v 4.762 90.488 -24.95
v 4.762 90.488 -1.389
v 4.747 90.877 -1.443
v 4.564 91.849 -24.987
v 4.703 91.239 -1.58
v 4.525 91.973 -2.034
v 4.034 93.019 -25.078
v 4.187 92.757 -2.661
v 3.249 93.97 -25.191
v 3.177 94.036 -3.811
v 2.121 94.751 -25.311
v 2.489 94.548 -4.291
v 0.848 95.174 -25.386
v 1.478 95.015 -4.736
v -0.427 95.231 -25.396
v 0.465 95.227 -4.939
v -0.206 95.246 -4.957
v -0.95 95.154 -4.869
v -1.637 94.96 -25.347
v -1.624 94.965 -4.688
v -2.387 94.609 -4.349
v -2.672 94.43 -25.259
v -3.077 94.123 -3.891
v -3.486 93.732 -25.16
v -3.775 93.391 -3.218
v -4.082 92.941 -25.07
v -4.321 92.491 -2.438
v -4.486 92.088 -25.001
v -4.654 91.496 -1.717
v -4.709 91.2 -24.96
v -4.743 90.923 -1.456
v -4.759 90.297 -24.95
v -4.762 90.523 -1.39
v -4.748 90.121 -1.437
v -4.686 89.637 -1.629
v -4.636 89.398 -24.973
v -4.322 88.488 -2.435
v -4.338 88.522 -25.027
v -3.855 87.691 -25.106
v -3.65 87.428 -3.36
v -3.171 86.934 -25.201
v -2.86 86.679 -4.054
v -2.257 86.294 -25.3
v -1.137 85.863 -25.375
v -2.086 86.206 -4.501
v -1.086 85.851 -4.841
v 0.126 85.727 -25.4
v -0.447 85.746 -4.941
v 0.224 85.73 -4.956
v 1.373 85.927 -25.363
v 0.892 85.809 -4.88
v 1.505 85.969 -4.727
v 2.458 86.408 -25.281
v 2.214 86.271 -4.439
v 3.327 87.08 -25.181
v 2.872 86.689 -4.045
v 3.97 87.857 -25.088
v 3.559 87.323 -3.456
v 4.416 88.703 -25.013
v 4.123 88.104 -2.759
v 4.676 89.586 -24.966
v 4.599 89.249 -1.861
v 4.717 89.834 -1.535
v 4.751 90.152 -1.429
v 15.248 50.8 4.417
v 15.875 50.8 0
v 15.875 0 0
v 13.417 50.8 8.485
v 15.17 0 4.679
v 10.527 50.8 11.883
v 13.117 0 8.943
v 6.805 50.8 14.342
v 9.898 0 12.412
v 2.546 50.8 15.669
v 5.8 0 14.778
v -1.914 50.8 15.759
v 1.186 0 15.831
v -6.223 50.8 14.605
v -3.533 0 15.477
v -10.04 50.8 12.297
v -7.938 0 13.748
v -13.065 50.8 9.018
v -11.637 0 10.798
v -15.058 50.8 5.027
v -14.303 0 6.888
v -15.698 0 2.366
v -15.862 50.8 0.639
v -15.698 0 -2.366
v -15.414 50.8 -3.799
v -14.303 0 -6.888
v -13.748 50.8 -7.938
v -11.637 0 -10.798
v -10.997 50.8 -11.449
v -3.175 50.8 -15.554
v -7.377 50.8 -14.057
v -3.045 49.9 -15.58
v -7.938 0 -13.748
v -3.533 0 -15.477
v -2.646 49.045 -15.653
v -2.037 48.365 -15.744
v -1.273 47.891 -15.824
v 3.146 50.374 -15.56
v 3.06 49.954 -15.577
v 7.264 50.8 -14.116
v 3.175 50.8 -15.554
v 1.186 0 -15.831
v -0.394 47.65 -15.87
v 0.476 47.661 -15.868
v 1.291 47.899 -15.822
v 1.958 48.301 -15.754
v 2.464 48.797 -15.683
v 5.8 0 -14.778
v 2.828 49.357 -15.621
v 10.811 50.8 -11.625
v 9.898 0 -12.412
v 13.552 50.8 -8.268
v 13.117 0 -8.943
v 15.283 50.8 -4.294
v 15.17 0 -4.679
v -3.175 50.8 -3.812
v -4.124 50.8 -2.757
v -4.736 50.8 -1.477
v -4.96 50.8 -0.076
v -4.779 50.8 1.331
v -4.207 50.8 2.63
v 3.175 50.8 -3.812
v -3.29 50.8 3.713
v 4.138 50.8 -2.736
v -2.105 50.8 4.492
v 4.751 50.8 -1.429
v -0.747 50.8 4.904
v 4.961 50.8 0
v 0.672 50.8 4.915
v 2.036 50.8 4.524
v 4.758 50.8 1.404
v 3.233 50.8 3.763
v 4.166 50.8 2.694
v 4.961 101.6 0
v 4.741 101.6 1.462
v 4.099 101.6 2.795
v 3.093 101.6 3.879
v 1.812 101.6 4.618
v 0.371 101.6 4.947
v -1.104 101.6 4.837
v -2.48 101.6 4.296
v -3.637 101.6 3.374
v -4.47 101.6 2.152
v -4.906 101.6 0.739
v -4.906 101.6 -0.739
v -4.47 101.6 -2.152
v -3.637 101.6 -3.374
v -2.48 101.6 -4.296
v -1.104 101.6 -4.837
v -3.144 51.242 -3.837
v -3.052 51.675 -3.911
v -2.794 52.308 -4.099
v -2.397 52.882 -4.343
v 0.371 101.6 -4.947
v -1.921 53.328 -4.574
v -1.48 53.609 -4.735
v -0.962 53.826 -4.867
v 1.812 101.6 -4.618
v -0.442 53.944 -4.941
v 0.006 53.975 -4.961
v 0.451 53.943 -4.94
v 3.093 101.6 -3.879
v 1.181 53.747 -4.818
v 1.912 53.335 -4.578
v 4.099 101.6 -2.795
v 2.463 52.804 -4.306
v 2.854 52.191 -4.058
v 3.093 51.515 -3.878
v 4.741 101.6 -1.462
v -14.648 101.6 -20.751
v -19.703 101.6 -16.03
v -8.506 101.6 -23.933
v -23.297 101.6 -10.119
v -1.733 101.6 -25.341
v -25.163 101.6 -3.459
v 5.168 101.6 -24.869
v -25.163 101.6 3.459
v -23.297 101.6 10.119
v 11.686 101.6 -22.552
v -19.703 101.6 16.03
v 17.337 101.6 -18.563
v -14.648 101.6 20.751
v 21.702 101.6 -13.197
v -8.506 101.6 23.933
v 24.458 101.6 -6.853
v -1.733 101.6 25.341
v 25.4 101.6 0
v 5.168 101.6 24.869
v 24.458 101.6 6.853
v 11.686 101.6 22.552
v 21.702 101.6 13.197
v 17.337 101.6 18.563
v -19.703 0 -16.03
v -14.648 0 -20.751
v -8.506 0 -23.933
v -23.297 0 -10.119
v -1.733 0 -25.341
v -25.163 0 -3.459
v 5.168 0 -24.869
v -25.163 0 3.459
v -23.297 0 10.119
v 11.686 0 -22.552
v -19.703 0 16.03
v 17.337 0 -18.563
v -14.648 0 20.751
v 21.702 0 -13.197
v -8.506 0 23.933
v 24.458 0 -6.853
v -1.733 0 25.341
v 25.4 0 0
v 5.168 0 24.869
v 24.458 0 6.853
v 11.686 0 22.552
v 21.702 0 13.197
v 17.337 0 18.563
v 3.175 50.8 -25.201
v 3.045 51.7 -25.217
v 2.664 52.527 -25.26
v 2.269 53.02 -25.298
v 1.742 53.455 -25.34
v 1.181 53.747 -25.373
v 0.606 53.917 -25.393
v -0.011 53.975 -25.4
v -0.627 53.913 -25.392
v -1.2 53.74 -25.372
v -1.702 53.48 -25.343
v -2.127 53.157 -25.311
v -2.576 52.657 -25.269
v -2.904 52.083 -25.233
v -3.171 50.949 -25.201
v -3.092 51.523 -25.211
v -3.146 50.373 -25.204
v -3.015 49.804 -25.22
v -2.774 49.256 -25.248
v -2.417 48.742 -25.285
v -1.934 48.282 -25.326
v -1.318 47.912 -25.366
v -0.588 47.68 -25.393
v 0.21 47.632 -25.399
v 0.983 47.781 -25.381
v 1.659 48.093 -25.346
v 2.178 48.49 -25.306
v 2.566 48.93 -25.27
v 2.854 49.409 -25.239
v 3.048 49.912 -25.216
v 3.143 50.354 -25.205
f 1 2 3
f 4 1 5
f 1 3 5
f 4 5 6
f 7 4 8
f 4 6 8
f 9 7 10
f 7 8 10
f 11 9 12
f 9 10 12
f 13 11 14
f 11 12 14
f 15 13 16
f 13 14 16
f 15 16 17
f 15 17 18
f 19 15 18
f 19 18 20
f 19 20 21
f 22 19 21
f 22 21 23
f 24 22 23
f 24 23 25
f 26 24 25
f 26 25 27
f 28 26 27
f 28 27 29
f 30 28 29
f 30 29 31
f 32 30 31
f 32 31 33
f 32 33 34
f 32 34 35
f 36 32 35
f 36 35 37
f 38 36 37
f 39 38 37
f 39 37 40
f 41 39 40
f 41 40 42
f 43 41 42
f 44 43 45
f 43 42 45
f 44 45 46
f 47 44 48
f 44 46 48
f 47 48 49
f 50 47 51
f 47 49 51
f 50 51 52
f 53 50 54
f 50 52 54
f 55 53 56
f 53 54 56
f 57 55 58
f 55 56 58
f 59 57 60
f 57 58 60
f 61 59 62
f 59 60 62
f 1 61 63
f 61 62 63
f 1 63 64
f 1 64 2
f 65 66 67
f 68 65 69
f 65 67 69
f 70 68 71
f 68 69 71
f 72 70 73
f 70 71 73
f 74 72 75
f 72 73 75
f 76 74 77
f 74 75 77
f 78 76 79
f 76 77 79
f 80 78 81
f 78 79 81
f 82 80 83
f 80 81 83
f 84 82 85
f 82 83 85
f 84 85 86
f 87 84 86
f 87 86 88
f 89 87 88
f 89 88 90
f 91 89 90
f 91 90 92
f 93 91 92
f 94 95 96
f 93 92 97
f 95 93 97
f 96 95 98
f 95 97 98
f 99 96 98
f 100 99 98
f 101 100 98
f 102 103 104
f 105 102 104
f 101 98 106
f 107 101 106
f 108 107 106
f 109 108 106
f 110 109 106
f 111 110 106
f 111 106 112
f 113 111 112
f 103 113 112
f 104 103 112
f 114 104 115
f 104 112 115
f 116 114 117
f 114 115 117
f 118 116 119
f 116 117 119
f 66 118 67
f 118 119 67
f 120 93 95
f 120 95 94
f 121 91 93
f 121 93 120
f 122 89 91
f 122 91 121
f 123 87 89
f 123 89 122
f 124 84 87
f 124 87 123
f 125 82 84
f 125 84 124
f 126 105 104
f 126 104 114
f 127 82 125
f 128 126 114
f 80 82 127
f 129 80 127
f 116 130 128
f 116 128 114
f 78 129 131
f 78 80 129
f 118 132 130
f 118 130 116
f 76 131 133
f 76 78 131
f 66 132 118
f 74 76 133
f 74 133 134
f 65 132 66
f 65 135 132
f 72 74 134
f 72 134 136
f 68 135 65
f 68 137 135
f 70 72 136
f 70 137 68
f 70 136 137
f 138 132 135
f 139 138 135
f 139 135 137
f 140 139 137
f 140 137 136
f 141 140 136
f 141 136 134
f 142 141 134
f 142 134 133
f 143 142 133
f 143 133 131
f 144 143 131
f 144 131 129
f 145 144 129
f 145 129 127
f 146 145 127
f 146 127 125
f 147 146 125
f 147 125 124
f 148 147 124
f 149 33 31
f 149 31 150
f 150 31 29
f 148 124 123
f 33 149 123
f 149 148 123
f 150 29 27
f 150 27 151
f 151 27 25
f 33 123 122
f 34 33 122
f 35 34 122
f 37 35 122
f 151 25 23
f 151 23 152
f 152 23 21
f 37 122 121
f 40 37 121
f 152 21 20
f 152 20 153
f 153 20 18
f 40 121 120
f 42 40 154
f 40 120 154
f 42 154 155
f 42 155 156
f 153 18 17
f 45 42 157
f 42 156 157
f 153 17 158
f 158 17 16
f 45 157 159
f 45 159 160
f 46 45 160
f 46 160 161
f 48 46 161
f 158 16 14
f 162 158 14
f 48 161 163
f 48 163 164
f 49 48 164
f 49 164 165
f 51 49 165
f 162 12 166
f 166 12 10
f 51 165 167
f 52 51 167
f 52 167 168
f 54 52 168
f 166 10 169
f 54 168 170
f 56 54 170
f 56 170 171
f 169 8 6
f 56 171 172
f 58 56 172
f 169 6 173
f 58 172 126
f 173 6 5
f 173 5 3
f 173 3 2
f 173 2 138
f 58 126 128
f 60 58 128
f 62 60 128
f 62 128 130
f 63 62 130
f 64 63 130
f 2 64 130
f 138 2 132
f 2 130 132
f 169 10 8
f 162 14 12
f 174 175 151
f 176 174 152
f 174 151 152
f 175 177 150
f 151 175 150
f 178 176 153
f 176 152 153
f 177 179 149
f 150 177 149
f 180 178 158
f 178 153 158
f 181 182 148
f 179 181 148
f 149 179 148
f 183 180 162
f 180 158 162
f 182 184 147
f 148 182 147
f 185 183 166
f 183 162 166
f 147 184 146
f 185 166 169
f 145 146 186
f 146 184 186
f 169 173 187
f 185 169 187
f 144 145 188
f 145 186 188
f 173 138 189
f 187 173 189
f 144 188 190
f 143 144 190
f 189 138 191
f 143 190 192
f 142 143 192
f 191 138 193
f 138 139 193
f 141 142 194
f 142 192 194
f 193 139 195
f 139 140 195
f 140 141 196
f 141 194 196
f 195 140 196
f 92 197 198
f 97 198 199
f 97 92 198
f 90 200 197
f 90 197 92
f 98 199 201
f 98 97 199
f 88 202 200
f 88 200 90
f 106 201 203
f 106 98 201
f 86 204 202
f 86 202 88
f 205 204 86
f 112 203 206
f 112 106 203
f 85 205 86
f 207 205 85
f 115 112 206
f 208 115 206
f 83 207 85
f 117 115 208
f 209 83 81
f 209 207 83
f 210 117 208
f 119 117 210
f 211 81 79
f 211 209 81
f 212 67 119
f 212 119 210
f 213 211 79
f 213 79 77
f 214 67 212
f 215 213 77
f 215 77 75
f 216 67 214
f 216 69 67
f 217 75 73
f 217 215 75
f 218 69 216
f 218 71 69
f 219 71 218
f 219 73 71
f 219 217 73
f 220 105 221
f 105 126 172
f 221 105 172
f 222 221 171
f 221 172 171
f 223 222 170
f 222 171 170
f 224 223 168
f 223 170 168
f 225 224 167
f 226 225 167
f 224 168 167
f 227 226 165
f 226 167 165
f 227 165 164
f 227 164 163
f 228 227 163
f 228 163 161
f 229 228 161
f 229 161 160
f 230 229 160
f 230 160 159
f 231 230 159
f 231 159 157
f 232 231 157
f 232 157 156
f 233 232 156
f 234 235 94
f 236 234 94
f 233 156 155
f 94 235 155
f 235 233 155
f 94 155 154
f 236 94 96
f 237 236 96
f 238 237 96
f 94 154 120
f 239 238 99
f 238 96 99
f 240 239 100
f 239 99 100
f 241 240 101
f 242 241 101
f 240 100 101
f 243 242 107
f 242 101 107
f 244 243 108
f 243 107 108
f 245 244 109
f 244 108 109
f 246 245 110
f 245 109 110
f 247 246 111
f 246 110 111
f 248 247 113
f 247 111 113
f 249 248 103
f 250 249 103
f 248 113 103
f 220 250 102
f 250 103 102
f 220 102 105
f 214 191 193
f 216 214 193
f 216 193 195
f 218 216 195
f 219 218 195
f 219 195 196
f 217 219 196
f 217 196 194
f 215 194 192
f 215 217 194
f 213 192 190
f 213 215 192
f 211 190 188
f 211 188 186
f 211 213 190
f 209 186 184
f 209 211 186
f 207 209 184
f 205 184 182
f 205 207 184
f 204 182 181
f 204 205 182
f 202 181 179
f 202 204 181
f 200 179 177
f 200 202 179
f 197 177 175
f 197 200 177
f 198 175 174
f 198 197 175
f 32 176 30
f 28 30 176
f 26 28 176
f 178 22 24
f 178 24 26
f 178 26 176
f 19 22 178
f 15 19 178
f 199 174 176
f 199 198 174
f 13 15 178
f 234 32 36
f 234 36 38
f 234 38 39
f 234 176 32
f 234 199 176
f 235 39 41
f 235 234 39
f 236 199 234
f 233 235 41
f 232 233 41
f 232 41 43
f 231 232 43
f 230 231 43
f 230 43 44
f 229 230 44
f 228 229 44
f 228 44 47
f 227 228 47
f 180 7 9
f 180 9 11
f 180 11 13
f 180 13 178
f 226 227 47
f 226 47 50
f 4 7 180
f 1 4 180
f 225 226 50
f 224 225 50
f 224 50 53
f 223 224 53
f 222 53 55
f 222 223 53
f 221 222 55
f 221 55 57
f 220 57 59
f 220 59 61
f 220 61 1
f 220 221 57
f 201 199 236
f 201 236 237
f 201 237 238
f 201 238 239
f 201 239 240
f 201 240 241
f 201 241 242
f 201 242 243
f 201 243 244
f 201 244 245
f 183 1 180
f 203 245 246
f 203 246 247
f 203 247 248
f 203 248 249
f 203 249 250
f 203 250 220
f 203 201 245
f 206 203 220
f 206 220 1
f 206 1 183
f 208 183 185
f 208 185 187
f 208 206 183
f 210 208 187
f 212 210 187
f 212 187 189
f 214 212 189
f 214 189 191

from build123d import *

# Parameters (mm, degrees)
F0_R     = 25.4
F1_DEPTH = 101.6
F2_R     = 15.875
F3_DEPTH = 50.8
F4_R     = 4.960938
F5_DEPTH = 101.601
F6_R     = 3.175
F7_DEPTH = 25.4
F8_R     = 4.7625
F9_DEPTH = 127


with BuildPart() as f1:
    # F0 (on Front) → F1 (new body)
    with BuildSketch(Plane.XZ):
        Circle(F0_R)
    extrude(amount=-F1_DEPTH)

    # F2 (on Front) → F3 (cut)
    with BuildSketch(Plane.XZ):
        Circle(F2_R)
    extrude(amount=-F3_DEPTH, mode=Mode.SUBTRACT)

    # F4 (on Front) → F5 (cut, through all)
    with BuildSketch(Plane.XZ):
        Circle(F4_R)
    extrude(amount=-F5_DEPTH, mode=Mode.SUBTRACT)

    # F6 (on Top) → F7 (cut)
    with BuildSketch(Plane.XY):
        with Locations((0, 50.8)):
            Circle(F6_R)
    extrude(amount=-F7_DEPTH, mode=Mode.SUBTRACT)

    # F8 (on Top) → F9 (cut)
    with BuildSketch(Plane.XY):
        with Locations((0, 90.4875)):
            Circle(F8_R)
    extrude(amount=-F9_DEPTH, mode=Mode.SUBTRACT)


solid = f1.part
